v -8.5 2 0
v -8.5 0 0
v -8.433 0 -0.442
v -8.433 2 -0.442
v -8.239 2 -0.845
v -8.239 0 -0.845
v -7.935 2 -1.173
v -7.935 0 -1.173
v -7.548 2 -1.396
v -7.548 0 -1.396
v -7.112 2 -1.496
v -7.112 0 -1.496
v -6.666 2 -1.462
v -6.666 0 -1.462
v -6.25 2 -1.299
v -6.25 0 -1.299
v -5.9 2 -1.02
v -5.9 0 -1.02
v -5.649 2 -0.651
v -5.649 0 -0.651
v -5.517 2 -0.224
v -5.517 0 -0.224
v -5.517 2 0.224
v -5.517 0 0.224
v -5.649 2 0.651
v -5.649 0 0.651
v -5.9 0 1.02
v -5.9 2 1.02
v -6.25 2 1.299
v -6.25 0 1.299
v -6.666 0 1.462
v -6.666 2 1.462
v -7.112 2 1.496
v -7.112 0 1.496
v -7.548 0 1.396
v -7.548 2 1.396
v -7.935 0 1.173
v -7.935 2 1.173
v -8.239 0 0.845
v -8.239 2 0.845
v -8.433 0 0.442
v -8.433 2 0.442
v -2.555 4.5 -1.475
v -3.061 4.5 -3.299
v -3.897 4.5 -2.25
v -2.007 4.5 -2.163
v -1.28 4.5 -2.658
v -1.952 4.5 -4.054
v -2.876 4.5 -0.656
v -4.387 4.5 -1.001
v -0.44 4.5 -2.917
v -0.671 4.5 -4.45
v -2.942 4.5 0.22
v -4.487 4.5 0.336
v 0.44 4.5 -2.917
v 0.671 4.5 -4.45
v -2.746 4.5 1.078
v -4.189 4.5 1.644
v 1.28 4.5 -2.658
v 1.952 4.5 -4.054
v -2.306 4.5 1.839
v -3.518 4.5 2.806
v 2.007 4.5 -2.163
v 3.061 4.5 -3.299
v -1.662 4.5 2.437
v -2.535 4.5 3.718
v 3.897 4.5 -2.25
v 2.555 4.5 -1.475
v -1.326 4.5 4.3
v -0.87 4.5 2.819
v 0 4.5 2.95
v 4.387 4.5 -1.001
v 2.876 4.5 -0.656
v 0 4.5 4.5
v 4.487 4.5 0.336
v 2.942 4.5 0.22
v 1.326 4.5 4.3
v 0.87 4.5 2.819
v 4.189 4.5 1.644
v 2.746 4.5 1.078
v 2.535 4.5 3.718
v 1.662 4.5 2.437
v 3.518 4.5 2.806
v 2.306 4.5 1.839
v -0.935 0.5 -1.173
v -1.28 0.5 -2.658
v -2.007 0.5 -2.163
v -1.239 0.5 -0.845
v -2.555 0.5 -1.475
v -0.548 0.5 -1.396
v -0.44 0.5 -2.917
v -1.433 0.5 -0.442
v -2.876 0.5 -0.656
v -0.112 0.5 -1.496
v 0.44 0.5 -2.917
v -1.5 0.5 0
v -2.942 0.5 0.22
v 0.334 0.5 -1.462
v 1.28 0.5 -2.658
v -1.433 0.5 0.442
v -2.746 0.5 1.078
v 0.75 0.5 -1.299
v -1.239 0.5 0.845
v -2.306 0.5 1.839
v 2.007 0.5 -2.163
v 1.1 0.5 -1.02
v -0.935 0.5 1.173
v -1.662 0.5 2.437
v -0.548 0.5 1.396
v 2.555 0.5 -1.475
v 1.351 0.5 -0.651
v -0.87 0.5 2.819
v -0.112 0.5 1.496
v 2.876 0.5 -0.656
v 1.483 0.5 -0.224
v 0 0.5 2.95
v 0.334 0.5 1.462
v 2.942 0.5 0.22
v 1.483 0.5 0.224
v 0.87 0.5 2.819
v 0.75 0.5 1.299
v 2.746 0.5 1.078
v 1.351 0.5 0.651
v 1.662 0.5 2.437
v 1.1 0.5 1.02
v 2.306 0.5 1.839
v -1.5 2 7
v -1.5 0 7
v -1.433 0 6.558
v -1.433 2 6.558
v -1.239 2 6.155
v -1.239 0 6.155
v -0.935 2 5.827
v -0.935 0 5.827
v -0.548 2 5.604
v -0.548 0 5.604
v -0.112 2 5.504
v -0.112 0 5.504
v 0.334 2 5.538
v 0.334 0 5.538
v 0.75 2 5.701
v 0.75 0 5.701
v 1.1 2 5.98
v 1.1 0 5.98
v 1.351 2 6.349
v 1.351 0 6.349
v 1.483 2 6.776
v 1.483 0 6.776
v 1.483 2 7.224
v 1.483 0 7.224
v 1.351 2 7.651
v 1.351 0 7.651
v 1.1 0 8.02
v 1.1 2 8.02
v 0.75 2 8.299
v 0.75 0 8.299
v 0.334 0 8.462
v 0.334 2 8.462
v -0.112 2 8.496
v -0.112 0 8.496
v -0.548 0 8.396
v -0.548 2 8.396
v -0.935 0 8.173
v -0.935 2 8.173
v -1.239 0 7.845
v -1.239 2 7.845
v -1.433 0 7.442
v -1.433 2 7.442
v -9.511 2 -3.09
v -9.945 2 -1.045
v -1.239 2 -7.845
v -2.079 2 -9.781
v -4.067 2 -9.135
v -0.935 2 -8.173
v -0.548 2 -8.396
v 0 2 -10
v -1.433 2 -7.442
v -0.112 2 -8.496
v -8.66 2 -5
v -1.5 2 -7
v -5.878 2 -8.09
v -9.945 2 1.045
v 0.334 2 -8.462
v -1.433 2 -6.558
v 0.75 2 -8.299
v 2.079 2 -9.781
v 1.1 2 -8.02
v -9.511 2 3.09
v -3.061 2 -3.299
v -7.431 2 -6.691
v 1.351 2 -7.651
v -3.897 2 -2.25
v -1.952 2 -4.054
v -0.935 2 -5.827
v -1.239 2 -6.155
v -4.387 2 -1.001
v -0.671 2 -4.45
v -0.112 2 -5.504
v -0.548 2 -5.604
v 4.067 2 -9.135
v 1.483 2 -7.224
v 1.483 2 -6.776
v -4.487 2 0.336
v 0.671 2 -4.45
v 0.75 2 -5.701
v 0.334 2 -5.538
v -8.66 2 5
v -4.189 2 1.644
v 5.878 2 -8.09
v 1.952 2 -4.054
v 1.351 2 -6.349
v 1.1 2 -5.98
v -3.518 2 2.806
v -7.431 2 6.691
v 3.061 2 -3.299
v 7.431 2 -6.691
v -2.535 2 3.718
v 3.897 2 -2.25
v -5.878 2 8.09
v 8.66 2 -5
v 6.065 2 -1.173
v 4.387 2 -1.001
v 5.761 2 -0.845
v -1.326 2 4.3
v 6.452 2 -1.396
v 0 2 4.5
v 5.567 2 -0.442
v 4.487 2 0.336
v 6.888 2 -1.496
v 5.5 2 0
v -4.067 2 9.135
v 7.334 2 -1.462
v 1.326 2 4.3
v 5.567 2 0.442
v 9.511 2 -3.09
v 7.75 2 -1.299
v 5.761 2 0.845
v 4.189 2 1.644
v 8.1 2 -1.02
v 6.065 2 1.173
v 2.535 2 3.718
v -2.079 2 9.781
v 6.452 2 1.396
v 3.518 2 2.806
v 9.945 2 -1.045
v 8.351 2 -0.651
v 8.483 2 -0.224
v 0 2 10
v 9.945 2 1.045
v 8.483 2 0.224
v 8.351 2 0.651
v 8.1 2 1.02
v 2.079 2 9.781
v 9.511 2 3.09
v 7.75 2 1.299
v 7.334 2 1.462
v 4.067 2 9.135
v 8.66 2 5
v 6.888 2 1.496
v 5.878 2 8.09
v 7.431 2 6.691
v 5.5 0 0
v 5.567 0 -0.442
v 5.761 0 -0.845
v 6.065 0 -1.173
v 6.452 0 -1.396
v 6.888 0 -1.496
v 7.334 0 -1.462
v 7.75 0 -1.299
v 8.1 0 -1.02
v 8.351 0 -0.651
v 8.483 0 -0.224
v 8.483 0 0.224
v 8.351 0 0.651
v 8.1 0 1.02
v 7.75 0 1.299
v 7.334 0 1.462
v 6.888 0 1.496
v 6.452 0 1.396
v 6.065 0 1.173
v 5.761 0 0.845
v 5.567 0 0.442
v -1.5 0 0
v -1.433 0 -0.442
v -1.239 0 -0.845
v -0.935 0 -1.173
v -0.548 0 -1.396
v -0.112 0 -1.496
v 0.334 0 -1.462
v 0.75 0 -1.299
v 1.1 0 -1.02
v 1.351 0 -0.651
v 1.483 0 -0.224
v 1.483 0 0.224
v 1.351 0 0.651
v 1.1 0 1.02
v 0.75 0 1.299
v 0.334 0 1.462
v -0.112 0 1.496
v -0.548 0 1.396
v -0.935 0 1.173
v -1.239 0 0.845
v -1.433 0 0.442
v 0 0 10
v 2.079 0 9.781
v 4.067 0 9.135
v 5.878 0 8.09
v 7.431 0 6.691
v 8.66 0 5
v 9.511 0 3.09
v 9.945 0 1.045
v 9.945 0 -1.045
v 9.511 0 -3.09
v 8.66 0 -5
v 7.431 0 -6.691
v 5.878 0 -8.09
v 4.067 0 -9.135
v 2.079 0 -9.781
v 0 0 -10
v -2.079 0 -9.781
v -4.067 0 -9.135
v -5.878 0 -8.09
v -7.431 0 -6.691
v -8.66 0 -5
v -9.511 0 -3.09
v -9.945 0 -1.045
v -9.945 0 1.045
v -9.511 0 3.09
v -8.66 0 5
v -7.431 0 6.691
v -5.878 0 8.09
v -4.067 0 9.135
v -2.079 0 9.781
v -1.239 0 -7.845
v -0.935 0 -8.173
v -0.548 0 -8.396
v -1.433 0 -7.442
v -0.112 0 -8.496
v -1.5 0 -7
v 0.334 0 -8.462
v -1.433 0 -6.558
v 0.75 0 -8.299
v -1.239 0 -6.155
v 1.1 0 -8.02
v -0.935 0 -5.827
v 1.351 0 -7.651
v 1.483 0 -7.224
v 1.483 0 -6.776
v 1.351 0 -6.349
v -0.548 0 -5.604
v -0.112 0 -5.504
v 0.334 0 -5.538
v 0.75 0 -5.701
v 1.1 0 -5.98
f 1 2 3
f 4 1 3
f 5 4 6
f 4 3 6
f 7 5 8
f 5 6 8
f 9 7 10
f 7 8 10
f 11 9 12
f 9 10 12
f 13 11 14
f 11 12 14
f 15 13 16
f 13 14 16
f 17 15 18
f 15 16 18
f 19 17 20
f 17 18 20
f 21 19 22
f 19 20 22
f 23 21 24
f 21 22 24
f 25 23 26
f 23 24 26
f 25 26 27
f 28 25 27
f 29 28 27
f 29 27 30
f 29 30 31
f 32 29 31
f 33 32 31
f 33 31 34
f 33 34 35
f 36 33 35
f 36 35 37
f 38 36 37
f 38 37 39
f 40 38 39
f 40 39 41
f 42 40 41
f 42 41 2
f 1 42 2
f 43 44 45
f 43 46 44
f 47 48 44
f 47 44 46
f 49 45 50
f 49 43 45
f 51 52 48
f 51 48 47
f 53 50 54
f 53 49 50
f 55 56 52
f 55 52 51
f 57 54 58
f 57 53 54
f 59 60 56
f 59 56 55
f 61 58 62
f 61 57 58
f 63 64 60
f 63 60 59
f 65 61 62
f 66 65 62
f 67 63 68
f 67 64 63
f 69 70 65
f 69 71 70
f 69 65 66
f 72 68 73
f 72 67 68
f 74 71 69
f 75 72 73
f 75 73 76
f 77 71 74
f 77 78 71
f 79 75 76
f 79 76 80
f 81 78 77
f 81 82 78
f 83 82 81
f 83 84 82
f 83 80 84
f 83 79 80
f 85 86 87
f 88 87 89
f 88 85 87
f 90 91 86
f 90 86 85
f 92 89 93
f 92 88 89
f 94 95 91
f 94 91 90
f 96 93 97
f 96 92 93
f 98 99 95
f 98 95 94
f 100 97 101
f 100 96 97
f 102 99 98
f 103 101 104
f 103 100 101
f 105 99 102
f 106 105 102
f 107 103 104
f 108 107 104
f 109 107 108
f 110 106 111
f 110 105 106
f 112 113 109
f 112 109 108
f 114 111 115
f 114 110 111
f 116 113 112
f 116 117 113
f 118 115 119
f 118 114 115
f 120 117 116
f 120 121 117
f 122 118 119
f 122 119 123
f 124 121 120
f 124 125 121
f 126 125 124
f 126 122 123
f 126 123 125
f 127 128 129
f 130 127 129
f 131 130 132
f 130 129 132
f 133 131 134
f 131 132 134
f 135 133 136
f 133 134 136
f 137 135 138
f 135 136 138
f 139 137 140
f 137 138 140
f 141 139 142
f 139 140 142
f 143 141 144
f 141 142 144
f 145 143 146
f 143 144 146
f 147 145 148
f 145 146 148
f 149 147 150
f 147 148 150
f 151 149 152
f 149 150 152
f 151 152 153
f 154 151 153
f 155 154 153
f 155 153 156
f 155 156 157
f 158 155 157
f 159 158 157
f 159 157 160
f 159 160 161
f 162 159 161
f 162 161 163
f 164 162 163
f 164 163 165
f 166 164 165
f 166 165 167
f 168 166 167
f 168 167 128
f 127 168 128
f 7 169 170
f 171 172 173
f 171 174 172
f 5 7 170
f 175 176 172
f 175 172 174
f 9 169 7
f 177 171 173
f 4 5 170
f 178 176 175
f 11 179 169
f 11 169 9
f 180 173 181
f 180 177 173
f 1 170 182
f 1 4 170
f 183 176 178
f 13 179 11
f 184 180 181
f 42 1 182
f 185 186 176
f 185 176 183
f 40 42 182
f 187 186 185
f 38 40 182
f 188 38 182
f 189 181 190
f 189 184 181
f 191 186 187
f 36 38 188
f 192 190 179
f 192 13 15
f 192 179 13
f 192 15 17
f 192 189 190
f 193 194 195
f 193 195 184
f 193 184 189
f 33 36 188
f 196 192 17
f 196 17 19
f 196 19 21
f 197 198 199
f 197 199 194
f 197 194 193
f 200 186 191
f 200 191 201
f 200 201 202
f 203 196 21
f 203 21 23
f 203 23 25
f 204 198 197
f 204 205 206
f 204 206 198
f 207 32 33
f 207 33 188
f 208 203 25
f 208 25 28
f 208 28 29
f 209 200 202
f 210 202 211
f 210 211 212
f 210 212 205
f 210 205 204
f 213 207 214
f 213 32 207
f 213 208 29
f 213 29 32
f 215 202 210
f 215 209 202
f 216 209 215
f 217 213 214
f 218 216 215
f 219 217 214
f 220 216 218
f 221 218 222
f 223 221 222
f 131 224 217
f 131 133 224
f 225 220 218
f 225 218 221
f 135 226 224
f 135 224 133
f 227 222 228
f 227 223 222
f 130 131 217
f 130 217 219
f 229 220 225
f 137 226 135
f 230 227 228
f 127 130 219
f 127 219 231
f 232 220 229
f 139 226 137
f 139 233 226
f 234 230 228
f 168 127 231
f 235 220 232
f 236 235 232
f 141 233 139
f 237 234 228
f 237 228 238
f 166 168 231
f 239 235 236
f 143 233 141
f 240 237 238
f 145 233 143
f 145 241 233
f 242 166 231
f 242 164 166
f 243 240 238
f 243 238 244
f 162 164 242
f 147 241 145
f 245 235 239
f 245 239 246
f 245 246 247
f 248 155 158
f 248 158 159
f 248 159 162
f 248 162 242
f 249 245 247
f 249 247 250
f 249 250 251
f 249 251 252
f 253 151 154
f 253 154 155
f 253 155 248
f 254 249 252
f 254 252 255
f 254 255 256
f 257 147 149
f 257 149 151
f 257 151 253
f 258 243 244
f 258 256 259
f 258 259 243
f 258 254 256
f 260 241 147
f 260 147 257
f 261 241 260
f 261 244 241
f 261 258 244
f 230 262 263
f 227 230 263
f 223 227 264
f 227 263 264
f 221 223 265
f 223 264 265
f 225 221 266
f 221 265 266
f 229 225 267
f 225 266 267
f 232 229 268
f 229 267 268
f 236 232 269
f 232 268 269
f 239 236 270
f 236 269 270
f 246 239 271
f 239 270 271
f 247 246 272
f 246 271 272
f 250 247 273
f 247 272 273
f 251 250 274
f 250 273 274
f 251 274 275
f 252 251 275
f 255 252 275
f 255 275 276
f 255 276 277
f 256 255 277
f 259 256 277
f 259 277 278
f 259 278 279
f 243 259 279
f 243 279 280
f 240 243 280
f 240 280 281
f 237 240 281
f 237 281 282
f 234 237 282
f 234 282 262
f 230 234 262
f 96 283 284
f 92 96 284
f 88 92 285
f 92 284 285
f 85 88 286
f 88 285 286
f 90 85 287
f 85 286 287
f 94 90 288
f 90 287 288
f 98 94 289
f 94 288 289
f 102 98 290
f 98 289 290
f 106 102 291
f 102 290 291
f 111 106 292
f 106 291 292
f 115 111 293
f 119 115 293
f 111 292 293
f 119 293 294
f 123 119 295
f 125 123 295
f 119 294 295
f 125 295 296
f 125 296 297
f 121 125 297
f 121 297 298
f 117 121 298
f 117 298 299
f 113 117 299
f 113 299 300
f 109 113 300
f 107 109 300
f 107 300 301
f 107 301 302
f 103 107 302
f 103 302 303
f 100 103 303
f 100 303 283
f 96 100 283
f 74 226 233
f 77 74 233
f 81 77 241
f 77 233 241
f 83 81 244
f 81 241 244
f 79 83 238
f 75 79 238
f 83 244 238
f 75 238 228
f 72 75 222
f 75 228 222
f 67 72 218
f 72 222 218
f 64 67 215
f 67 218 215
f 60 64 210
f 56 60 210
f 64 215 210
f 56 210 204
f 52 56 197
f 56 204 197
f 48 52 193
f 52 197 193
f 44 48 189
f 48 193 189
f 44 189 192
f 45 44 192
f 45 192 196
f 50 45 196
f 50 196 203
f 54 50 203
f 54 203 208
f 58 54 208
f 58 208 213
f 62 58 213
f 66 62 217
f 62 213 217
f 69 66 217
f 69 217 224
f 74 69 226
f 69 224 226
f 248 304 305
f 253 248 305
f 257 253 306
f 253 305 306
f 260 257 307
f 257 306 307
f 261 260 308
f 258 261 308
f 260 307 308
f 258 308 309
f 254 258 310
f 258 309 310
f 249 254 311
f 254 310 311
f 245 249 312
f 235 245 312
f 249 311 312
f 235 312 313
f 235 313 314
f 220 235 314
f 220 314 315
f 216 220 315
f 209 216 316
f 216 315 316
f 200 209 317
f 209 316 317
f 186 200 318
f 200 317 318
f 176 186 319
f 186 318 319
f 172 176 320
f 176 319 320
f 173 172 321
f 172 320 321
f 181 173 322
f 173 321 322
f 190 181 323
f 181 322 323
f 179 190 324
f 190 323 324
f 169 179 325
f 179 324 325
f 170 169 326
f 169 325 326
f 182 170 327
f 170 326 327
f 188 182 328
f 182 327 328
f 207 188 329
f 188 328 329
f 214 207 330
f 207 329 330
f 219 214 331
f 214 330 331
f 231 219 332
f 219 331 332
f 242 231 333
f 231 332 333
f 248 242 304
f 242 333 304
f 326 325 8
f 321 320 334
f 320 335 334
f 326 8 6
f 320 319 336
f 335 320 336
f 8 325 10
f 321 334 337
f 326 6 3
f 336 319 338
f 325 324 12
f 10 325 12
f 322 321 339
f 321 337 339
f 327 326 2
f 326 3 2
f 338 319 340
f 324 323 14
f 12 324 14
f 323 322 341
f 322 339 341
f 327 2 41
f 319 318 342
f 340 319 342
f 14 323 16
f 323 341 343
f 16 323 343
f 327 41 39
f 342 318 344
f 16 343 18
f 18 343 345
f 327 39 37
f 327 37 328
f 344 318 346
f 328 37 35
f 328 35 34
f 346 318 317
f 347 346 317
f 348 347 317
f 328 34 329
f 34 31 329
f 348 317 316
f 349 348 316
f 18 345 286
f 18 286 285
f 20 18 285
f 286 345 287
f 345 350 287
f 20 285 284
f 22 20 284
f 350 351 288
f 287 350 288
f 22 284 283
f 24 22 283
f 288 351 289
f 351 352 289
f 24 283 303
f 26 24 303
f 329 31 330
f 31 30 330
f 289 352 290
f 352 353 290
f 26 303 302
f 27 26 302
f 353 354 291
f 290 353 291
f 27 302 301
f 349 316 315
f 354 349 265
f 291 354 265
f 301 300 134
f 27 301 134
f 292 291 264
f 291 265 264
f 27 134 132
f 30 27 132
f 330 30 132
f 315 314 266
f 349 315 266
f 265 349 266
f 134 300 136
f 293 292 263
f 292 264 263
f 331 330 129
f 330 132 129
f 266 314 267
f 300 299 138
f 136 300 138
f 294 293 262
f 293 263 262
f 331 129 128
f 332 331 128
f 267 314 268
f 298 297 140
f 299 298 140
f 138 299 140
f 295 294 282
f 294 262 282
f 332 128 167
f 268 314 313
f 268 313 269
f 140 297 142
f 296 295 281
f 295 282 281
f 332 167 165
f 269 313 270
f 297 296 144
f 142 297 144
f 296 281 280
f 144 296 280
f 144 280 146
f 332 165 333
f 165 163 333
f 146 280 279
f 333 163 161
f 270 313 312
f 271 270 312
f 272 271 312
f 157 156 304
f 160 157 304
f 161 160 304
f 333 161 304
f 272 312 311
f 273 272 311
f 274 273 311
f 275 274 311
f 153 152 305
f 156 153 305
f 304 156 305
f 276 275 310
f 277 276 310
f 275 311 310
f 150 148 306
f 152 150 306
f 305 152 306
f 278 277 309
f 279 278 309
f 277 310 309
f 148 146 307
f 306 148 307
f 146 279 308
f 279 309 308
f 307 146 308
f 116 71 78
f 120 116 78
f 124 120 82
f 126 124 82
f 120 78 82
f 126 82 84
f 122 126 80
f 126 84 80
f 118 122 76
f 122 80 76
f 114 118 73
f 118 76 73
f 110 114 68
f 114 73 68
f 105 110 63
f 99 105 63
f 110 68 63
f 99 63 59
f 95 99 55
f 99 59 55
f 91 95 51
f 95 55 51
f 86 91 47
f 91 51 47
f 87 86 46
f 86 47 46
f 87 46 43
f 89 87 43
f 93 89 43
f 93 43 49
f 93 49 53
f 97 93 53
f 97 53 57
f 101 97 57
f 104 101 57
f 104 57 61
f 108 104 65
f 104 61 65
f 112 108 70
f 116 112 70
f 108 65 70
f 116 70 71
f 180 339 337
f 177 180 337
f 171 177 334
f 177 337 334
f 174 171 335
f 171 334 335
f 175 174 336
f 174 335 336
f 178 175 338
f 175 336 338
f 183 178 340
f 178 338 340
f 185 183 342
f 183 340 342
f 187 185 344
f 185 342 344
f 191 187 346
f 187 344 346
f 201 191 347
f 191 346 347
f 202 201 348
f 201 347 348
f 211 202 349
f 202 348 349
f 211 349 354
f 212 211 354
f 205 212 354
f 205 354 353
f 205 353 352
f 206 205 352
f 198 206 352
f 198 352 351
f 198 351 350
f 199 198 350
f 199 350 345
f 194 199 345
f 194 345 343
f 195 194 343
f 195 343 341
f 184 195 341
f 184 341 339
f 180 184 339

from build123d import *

# Parameters (mm, degrees)
SKETCH_1_R            = 10
EXTRUDE_1_DEPTH       = 2
SKETCH_2_R            = 4.5
EXTRUDE_2_DEPTH       = 2.5
SKETCH_3_R            = 2.95
CUT_EXTRUDE_1_DEPTH   = 4
HOLE_WIZARD_3_0_3_1_D = 3


with BuildPart() as part:
    # 草图1 → 凸台-拉伸1 (new body)
    with BuildSketch(Plane(origin=(0, 0, 0), x_dir=(1, 0, 0), z_dir=(0, 1, 0))):
        with Locations(Location((0, 0, 0), (0, 0, 270))):
            Circle(SKETCH_1_R)
    extrude(amount=EXTRUDE_1_DEPTH)

    # 草图2 → 凸台-拉伸2 (add)
    with BuildSketch(Plane(origin=(0, 2, 0), x_dir=(1, 0, 0), z_dir=(0, 1, 0))):
        with Locations(Location((0, 0, 0), (0, 0, 270))):
            Circle(SKETCH_2_R)
    extrude(amount=EXTRUDE_2_DEPTH)

    # 草图3 → 切除-拉伸1 (cut)
    with BuildSketch(Plane(origin=(0, 4.5, 0), x_dir=(1, 0, 0), z_dir=(0, 1, 0))):
        with Locations(Location((0, 0, 0), (0, 0, 270))):
            Circle(SKETCH_3_R)
    extrude(amount=-CUT_EXTRUDE_1_DEPTH, mode=Mode.SUBTRACT)

    # Ø3.0 (3) 直径孔1 (through all)
    with Locations(Plane(origin=(0, 2, 0), x_dir=(1, 0, 0), z_dir=(0, 1, 0))):
        with Locations((0, 7), (7, 0), (0, -7), (-7, 0), (0, 0)):
            Hole(HOLE_WIZARD_3_0_3_1_D / 2)


solid = part.part
